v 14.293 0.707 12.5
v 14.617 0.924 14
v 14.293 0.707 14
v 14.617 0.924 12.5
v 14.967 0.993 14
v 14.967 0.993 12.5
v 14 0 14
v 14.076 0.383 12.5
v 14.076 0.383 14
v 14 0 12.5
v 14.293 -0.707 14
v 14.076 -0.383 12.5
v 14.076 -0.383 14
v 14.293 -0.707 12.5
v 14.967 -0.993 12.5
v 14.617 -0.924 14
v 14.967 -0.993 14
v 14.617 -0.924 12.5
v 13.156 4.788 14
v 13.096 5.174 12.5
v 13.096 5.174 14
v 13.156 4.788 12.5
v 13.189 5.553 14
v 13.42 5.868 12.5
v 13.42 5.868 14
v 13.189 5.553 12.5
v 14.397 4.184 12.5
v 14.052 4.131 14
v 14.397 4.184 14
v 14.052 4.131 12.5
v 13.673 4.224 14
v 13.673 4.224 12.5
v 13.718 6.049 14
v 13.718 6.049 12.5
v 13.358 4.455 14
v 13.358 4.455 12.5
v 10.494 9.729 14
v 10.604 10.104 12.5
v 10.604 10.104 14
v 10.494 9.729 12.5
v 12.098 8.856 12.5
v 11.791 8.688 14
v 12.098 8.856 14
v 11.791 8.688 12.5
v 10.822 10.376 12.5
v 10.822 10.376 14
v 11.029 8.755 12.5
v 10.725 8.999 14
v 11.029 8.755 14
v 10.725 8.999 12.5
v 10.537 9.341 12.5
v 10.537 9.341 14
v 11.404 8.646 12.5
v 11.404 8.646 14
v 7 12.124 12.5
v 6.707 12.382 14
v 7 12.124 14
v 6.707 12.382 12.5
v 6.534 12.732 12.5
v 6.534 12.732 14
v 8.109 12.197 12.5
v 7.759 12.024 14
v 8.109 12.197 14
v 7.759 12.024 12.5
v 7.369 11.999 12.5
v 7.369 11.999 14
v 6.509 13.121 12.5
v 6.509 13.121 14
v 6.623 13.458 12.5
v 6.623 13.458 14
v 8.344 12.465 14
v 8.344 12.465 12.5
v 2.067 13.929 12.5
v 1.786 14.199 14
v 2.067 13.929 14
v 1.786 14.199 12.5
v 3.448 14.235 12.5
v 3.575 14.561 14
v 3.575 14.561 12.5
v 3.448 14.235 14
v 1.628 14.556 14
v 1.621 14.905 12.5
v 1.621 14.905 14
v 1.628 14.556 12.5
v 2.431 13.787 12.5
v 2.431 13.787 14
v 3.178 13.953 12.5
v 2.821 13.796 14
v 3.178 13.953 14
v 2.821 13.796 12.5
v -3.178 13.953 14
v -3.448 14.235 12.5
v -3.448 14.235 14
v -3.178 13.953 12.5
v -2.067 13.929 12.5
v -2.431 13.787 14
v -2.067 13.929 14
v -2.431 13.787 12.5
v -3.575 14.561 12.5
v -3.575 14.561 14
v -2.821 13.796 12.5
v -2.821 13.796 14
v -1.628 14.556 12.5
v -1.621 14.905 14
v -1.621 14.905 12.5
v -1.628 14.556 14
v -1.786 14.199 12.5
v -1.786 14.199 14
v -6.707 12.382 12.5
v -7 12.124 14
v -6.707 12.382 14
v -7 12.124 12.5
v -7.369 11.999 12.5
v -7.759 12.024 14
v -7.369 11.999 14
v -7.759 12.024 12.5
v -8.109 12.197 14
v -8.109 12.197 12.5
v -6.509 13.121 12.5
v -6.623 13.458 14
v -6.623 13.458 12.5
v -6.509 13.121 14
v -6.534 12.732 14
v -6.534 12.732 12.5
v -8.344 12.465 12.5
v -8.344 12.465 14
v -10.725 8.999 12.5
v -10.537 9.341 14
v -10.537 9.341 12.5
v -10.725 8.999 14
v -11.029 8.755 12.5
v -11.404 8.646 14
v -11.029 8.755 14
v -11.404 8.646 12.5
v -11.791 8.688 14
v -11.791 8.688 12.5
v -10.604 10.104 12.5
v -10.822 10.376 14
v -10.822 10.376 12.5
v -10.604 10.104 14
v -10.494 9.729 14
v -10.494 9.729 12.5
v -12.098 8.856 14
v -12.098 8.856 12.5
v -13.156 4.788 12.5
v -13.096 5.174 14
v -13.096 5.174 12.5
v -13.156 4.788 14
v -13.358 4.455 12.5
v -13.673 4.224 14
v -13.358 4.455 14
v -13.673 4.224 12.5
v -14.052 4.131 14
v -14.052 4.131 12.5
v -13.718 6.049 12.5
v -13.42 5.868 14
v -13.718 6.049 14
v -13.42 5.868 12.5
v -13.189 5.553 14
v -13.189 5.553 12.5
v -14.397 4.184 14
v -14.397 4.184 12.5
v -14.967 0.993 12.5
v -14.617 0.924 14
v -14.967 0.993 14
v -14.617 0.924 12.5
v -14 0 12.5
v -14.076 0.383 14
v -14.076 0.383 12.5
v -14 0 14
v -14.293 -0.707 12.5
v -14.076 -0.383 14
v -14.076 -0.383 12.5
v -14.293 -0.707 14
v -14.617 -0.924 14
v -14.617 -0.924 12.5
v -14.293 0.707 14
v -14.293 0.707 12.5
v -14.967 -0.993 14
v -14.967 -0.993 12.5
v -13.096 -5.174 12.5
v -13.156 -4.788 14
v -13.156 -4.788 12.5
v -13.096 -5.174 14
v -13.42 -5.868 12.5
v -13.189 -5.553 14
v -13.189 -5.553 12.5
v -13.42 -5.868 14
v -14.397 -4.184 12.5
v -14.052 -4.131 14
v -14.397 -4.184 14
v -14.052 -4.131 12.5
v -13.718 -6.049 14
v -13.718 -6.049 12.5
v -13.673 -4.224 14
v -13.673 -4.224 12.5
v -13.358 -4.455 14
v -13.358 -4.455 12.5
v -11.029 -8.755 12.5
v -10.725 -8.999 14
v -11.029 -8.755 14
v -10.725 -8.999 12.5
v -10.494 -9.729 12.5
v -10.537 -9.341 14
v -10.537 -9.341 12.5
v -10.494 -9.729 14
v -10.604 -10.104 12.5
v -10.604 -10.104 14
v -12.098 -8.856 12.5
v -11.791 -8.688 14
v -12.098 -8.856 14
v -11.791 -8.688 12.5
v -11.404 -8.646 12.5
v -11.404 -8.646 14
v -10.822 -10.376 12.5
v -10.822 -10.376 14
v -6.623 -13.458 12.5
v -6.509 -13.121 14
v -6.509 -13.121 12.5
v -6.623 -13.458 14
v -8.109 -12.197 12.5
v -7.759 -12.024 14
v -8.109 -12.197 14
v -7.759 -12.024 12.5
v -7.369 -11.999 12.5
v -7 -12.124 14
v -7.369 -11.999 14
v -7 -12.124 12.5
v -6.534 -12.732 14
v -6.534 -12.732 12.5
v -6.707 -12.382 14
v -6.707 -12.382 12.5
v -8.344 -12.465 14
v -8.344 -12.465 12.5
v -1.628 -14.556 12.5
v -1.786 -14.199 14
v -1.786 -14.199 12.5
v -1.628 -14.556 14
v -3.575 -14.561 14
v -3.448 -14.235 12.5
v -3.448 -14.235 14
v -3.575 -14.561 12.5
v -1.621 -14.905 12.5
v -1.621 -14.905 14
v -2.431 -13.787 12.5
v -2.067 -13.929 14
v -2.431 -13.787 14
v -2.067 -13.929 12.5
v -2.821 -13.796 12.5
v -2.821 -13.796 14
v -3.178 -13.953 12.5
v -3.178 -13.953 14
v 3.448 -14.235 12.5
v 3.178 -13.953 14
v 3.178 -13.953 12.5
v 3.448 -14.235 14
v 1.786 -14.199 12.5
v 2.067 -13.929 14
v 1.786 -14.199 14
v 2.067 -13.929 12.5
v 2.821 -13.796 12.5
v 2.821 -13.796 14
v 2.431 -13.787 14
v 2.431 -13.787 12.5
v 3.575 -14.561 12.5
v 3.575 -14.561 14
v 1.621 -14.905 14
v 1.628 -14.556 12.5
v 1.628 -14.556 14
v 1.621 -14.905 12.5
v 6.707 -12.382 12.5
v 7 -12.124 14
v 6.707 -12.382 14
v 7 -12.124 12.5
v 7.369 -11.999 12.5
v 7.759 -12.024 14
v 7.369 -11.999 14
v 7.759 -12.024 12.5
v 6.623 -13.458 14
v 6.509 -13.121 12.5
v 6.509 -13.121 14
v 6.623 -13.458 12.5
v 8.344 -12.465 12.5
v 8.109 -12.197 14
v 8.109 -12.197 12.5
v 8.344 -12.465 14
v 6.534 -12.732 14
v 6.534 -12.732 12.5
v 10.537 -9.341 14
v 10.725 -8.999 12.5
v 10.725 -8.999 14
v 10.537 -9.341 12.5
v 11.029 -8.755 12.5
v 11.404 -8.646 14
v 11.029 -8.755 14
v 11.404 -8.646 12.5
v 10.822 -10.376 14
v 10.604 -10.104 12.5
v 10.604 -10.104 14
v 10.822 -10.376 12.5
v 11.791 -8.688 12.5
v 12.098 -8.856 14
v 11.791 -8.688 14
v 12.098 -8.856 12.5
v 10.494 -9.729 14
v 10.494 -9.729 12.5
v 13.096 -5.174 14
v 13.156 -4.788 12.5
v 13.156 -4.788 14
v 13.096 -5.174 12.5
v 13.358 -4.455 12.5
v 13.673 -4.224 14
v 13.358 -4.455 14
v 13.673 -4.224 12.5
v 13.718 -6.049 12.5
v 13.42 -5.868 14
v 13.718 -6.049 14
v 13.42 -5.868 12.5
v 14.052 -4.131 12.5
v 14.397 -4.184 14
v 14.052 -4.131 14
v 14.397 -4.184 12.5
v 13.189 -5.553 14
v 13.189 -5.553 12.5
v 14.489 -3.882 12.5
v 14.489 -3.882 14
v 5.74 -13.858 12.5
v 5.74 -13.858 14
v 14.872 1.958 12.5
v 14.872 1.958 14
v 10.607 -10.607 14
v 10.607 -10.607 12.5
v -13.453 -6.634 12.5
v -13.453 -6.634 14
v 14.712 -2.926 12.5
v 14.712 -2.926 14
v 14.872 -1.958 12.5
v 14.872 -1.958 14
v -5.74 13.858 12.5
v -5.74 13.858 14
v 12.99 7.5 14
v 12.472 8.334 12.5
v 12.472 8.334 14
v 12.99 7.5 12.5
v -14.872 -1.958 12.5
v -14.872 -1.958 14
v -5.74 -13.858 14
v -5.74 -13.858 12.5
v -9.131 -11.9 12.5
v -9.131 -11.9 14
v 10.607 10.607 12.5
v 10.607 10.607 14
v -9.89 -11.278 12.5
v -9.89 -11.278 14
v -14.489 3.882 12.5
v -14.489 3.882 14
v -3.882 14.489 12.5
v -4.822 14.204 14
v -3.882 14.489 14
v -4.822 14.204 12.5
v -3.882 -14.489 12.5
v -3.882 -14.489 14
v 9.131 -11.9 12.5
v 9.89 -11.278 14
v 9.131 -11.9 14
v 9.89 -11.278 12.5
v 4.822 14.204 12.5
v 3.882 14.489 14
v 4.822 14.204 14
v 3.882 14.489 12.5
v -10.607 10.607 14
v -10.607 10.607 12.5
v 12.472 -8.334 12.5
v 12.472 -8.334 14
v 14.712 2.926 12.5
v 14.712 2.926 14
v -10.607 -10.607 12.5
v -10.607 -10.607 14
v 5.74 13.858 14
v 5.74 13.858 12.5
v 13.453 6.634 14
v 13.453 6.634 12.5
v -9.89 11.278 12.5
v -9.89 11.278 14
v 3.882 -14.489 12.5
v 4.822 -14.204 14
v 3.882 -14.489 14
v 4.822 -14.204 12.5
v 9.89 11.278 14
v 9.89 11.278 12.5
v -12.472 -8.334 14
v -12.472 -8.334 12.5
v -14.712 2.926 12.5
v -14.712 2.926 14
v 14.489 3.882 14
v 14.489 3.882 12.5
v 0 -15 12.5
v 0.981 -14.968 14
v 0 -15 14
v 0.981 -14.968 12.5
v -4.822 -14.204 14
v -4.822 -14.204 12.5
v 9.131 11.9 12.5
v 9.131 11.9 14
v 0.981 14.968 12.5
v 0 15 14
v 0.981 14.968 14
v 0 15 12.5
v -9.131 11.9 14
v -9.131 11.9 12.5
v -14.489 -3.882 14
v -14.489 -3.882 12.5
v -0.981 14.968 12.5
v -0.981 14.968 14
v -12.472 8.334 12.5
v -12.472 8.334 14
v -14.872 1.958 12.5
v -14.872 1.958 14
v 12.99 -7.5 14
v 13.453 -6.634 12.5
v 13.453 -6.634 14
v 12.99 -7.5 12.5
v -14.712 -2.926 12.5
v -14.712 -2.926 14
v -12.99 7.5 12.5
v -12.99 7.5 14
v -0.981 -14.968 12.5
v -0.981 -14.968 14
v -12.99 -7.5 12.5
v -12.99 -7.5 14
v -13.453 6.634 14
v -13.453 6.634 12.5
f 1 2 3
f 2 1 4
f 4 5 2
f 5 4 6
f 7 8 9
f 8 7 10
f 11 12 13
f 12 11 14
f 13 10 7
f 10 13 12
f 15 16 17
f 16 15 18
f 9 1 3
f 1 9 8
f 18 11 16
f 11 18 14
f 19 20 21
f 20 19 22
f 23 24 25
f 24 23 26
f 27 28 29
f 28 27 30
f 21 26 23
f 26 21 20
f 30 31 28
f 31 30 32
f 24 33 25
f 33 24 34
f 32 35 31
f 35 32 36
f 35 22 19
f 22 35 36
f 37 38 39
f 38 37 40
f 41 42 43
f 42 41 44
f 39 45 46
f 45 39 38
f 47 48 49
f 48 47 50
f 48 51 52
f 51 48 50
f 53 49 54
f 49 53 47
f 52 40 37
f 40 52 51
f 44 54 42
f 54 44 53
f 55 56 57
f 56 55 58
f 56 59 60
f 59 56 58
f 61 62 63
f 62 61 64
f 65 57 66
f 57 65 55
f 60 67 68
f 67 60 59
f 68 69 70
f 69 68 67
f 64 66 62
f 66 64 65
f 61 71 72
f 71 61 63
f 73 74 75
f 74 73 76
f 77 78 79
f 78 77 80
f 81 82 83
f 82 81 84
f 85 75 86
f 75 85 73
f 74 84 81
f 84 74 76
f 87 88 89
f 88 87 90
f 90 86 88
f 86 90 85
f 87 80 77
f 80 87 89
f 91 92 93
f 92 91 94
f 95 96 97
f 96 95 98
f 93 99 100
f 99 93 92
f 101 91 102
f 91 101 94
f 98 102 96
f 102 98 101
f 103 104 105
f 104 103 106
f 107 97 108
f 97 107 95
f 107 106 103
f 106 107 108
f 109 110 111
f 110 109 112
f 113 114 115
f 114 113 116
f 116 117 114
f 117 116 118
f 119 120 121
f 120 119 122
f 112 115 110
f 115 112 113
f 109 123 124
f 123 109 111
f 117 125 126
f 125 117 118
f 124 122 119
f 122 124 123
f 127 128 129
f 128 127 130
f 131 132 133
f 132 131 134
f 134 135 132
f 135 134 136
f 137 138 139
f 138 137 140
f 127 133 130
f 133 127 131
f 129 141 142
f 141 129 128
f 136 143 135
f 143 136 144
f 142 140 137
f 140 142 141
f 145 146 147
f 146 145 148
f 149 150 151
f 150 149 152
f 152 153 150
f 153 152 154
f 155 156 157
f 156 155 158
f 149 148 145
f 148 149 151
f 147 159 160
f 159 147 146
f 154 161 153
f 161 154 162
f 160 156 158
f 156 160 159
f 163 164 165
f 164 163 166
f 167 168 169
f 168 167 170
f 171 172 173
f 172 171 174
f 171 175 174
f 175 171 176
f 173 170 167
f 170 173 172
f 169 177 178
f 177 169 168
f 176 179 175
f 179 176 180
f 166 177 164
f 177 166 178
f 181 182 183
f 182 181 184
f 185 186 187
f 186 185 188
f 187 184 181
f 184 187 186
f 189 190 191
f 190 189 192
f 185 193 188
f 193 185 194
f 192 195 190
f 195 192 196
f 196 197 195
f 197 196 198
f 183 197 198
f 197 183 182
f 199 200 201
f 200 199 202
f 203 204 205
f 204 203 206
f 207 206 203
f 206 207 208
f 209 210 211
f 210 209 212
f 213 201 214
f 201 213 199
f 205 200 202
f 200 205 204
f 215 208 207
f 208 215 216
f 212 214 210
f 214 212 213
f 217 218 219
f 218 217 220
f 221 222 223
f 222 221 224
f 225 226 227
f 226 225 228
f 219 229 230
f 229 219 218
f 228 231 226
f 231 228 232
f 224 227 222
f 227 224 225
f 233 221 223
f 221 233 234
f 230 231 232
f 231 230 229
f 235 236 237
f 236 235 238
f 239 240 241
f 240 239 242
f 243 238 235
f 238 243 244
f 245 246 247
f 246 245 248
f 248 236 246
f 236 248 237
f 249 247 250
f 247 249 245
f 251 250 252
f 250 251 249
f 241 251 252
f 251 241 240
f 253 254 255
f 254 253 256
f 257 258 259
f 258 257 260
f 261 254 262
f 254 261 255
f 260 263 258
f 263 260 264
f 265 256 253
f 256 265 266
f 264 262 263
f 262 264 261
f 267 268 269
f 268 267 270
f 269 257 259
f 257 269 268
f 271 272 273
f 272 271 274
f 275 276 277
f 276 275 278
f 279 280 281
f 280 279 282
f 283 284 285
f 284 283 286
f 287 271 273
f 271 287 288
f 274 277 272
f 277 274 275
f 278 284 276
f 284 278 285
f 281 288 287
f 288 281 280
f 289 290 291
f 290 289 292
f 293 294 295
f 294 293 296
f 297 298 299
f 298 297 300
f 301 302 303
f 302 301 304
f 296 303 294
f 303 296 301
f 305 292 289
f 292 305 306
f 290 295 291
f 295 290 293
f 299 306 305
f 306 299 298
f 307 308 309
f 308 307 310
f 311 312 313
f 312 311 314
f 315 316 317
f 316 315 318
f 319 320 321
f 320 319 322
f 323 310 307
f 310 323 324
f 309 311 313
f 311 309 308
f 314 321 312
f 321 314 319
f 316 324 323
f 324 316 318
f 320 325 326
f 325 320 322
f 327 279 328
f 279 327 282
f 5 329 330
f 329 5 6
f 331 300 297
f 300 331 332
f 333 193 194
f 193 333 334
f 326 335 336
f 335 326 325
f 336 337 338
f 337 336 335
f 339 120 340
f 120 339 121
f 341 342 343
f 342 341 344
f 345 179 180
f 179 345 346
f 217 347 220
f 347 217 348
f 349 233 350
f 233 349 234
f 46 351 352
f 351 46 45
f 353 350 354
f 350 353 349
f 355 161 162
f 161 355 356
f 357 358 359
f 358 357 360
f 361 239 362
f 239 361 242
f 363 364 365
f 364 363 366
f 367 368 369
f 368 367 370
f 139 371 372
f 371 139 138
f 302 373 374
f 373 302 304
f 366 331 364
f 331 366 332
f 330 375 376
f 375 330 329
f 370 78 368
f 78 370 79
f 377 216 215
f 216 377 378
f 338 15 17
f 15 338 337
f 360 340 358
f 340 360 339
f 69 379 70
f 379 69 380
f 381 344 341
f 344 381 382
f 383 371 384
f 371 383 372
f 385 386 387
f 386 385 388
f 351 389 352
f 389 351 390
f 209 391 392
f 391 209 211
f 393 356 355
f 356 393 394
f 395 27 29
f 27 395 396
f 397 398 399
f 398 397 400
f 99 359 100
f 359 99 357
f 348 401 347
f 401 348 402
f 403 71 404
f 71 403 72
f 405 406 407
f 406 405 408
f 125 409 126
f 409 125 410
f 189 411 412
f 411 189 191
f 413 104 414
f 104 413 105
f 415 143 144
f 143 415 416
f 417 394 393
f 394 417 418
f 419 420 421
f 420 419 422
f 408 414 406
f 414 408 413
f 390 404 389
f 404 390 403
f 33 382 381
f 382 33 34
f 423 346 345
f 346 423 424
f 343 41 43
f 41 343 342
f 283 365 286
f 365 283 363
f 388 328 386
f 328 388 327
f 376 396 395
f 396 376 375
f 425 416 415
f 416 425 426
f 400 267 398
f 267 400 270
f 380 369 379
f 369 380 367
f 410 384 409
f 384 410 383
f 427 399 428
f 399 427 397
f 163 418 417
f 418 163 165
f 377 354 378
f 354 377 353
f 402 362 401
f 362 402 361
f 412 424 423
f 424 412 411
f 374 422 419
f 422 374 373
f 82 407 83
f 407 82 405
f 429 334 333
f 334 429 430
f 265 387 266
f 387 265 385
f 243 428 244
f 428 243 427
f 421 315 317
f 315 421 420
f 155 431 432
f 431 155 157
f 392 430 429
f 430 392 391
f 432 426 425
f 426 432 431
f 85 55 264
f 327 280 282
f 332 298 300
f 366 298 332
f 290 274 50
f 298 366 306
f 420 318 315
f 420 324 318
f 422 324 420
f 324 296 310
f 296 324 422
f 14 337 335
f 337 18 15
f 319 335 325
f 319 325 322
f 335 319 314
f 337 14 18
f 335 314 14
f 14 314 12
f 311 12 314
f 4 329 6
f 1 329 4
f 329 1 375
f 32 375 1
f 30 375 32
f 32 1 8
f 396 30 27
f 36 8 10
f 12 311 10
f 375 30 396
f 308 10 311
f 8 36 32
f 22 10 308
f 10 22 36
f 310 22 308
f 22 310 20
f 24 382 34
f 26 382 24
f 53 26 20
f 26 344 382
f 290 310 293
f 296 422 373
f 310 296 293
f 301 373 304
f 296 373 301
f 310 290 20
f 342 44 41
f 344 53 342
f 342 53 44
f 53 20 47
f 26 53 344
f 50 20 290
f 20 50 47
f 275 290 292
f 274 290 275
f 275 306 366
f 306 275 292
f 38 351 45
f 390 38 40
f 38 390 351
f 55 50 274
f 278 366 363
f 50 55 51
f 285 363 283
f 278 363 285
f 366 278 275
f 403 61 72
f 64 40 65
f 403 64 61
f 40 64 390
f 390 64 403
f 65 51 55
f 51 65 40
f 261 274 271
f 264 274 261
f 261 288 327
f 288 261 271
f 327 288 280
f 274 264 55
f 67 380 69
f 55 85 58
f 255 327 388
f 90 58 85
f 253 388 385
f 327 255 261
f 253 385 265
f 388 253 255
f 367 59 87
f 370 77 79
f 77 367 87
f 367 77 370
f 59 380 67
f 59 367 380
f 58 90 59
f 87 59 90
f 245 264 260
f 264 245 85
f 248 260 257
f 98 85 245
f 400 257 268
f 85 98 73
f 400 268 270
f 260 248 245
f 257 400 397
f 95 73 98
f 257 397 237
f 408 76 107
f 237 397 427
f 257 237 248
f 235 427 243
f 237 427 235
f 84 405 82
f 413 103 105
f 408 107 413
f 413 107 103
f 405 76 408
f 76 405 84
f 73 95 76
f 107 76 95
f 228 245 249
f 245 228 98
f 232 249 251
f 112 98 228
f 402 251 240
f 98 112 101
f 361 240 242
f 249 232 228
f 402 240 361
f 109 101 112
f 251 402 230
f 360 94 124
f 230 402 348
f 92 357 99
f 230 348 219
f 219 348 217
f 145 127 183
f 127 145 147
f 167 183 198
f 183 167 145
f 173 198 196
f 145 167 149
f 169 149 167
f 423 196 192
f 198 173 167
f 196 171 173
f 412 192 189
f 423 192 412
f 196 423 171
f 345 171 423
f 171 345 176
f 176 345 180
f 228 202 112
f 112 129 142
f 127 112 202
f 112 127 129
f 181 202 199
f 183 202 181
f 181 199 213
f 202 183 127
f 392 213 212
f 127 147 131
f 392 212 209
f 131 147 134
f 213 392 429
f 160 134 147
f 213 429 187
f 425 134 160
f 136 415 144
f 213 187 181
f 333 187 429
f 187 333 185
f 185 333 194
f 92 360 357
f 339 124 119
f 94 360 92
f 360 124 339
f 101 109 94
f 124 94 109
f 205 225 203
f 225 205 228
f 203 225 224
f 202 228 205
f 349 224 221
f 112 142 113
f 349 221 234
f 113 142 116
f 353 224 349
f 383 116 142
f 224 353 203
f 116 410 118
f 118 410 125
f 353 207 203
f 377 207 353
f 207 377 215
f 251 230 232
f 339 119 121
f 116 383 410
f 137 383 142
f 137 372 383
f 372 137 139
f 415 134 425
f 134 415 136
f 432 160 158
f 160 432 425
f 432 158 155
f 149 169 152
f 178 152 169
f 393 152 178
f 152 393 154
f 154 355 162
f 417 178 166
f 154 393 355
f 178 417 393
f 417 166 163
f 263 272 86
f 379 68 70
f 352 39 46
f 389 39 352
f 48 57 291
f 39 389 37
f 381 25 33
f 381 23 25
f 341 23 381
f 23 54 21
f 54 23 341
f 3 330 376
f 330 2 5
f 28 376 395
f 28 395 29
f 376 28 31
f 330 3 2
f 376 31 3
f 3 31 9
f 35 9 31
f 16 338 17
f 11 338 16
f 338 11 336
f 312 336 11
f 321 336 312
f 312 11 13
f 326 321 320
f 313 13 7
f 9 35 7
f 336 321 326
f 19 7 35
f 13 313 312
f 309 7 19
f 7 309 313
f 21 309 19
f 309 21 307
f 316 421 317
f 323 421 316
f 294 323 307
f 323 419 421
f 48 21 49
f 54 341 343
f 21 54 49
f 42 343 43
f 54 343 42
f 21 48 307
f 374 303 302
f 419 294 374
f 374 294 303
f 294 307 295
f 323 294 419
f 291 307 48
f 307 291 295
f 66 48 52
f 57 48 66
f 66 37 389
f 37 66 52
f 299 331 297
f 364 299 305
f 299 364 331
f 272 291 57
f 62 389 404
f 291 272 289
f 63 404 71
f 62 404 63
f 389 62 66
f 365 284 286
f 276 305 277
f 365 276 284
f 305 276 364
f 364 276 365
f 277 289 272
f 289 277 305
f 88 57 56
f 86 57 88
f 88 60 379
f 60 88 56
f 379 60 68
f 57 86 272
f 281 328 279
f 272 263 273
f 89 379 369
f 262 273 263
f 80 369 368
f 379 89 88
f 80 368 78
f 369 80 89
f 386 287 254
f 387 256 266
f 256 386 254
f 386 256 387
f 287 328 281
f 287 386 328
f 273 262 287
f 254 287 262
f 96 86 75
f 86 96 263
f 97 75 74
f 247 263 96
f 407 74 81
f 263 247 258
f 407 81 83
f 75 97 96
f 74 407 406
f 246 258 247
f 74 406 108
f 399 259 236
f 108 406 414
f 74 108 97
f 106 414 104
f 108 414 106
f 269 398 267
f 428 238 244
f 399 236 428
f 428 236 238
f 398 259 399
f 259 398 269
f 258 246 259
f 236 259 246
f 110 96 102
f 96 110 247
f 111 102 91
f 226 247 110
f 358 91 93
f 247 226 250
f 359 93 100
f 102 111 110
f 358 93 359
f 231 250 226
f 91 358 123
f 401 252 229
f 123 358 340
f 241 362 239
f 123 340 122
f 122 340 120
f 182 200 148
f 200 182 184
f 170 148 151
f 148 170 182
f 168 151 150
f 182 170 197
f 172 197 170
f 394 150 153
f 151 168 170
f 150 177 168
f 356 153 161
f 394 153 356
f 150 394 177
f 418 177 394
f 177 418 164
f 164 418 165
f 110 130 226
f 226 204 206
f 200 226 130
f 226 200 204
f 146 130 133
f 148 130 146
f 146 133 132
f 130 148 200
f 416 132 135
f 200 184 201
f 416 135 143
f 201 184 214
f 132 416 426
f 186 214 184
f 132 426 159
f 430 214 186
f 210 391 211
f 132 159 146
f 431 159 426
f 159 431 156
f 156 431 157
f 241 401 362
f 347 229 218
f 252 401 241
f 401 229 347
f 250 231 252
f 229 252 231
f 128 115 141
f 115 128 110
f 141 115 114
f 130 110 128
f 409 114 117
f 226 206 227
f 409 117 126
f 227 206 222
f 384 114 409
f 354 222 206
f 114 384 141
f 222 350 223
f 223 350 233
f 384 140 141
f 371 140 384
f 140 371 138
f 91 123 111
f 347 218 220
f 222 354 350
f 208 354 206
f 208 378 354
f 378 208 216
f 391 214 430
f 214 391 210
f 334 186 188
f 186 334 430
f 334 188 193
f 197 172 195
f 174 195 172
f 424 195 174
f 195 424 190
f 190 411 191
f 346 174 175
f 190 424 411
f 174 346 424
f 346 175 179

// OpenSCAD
// Replacement knob for hotplate stirrer (D-shaft 6 mm)
// Print orientation: flat bottom face on bed (z = 0), builds upward.

// ---------------- Parameters ----------------
knob_d        = 30;    // knob outer diameter
knob_h        = 15;    // knob height
shaft_d       = 6.2;   // D-bore diameter
shaft_bore_l  = 12;    // D-bore depth from bottom face
groove_count  = 18;    // number of vertical grip grooves
groove_d      = 2;     // groove diameter (half-cylinder)
pointer_w     = 1.5;   // pointer groove width
pointer_d     = 1;     // pointer groove depth
eps           = 0.5;   // overcut for clean differences

$fn = 96;

// ---------------- Derived ----------------
outer_r = knob_d / 2;
// D-bore: circle diameter = shaft_d, flat depth = (shaft_d - shaft_bore_l)
flat_r  = (shaft_d - shaft_bore_l) / 2;

// ---------------- Model ----------------
difference() {
    // Main body
    cylinder(d = knob_d, h = knob_h);

    // D-shaped blind bore from bottom face
    translate([0, 0, -eps])
        linear_extrude(height = shaft_bore_l + 2 * eps)
            hull() {
                circle(r = outer_r + eps);   // curved side of D
                translate([0, -flat_r, 0])
                    square([shaft_d, shaft_bore_l + 2 * eps]); // flat side
            }

    // Vertical grip grooves along full height
    for (i = [0 : groove_count - 1])
        rotate([0, 0, i * 360 / groove_count])
            translate([outer_r, 0, -eps])
                cylinder(d = groove_d, h = knob_h + 2 * eps, $fn = 16);

    // Pointer groove on top face (centre to outer edge)
    translate([0, 0, knob_h - pointer_d])
        linear_extrude(height = pointer_d + eps)
            circle(r = outer_r + eps, $fn = 96);
}
